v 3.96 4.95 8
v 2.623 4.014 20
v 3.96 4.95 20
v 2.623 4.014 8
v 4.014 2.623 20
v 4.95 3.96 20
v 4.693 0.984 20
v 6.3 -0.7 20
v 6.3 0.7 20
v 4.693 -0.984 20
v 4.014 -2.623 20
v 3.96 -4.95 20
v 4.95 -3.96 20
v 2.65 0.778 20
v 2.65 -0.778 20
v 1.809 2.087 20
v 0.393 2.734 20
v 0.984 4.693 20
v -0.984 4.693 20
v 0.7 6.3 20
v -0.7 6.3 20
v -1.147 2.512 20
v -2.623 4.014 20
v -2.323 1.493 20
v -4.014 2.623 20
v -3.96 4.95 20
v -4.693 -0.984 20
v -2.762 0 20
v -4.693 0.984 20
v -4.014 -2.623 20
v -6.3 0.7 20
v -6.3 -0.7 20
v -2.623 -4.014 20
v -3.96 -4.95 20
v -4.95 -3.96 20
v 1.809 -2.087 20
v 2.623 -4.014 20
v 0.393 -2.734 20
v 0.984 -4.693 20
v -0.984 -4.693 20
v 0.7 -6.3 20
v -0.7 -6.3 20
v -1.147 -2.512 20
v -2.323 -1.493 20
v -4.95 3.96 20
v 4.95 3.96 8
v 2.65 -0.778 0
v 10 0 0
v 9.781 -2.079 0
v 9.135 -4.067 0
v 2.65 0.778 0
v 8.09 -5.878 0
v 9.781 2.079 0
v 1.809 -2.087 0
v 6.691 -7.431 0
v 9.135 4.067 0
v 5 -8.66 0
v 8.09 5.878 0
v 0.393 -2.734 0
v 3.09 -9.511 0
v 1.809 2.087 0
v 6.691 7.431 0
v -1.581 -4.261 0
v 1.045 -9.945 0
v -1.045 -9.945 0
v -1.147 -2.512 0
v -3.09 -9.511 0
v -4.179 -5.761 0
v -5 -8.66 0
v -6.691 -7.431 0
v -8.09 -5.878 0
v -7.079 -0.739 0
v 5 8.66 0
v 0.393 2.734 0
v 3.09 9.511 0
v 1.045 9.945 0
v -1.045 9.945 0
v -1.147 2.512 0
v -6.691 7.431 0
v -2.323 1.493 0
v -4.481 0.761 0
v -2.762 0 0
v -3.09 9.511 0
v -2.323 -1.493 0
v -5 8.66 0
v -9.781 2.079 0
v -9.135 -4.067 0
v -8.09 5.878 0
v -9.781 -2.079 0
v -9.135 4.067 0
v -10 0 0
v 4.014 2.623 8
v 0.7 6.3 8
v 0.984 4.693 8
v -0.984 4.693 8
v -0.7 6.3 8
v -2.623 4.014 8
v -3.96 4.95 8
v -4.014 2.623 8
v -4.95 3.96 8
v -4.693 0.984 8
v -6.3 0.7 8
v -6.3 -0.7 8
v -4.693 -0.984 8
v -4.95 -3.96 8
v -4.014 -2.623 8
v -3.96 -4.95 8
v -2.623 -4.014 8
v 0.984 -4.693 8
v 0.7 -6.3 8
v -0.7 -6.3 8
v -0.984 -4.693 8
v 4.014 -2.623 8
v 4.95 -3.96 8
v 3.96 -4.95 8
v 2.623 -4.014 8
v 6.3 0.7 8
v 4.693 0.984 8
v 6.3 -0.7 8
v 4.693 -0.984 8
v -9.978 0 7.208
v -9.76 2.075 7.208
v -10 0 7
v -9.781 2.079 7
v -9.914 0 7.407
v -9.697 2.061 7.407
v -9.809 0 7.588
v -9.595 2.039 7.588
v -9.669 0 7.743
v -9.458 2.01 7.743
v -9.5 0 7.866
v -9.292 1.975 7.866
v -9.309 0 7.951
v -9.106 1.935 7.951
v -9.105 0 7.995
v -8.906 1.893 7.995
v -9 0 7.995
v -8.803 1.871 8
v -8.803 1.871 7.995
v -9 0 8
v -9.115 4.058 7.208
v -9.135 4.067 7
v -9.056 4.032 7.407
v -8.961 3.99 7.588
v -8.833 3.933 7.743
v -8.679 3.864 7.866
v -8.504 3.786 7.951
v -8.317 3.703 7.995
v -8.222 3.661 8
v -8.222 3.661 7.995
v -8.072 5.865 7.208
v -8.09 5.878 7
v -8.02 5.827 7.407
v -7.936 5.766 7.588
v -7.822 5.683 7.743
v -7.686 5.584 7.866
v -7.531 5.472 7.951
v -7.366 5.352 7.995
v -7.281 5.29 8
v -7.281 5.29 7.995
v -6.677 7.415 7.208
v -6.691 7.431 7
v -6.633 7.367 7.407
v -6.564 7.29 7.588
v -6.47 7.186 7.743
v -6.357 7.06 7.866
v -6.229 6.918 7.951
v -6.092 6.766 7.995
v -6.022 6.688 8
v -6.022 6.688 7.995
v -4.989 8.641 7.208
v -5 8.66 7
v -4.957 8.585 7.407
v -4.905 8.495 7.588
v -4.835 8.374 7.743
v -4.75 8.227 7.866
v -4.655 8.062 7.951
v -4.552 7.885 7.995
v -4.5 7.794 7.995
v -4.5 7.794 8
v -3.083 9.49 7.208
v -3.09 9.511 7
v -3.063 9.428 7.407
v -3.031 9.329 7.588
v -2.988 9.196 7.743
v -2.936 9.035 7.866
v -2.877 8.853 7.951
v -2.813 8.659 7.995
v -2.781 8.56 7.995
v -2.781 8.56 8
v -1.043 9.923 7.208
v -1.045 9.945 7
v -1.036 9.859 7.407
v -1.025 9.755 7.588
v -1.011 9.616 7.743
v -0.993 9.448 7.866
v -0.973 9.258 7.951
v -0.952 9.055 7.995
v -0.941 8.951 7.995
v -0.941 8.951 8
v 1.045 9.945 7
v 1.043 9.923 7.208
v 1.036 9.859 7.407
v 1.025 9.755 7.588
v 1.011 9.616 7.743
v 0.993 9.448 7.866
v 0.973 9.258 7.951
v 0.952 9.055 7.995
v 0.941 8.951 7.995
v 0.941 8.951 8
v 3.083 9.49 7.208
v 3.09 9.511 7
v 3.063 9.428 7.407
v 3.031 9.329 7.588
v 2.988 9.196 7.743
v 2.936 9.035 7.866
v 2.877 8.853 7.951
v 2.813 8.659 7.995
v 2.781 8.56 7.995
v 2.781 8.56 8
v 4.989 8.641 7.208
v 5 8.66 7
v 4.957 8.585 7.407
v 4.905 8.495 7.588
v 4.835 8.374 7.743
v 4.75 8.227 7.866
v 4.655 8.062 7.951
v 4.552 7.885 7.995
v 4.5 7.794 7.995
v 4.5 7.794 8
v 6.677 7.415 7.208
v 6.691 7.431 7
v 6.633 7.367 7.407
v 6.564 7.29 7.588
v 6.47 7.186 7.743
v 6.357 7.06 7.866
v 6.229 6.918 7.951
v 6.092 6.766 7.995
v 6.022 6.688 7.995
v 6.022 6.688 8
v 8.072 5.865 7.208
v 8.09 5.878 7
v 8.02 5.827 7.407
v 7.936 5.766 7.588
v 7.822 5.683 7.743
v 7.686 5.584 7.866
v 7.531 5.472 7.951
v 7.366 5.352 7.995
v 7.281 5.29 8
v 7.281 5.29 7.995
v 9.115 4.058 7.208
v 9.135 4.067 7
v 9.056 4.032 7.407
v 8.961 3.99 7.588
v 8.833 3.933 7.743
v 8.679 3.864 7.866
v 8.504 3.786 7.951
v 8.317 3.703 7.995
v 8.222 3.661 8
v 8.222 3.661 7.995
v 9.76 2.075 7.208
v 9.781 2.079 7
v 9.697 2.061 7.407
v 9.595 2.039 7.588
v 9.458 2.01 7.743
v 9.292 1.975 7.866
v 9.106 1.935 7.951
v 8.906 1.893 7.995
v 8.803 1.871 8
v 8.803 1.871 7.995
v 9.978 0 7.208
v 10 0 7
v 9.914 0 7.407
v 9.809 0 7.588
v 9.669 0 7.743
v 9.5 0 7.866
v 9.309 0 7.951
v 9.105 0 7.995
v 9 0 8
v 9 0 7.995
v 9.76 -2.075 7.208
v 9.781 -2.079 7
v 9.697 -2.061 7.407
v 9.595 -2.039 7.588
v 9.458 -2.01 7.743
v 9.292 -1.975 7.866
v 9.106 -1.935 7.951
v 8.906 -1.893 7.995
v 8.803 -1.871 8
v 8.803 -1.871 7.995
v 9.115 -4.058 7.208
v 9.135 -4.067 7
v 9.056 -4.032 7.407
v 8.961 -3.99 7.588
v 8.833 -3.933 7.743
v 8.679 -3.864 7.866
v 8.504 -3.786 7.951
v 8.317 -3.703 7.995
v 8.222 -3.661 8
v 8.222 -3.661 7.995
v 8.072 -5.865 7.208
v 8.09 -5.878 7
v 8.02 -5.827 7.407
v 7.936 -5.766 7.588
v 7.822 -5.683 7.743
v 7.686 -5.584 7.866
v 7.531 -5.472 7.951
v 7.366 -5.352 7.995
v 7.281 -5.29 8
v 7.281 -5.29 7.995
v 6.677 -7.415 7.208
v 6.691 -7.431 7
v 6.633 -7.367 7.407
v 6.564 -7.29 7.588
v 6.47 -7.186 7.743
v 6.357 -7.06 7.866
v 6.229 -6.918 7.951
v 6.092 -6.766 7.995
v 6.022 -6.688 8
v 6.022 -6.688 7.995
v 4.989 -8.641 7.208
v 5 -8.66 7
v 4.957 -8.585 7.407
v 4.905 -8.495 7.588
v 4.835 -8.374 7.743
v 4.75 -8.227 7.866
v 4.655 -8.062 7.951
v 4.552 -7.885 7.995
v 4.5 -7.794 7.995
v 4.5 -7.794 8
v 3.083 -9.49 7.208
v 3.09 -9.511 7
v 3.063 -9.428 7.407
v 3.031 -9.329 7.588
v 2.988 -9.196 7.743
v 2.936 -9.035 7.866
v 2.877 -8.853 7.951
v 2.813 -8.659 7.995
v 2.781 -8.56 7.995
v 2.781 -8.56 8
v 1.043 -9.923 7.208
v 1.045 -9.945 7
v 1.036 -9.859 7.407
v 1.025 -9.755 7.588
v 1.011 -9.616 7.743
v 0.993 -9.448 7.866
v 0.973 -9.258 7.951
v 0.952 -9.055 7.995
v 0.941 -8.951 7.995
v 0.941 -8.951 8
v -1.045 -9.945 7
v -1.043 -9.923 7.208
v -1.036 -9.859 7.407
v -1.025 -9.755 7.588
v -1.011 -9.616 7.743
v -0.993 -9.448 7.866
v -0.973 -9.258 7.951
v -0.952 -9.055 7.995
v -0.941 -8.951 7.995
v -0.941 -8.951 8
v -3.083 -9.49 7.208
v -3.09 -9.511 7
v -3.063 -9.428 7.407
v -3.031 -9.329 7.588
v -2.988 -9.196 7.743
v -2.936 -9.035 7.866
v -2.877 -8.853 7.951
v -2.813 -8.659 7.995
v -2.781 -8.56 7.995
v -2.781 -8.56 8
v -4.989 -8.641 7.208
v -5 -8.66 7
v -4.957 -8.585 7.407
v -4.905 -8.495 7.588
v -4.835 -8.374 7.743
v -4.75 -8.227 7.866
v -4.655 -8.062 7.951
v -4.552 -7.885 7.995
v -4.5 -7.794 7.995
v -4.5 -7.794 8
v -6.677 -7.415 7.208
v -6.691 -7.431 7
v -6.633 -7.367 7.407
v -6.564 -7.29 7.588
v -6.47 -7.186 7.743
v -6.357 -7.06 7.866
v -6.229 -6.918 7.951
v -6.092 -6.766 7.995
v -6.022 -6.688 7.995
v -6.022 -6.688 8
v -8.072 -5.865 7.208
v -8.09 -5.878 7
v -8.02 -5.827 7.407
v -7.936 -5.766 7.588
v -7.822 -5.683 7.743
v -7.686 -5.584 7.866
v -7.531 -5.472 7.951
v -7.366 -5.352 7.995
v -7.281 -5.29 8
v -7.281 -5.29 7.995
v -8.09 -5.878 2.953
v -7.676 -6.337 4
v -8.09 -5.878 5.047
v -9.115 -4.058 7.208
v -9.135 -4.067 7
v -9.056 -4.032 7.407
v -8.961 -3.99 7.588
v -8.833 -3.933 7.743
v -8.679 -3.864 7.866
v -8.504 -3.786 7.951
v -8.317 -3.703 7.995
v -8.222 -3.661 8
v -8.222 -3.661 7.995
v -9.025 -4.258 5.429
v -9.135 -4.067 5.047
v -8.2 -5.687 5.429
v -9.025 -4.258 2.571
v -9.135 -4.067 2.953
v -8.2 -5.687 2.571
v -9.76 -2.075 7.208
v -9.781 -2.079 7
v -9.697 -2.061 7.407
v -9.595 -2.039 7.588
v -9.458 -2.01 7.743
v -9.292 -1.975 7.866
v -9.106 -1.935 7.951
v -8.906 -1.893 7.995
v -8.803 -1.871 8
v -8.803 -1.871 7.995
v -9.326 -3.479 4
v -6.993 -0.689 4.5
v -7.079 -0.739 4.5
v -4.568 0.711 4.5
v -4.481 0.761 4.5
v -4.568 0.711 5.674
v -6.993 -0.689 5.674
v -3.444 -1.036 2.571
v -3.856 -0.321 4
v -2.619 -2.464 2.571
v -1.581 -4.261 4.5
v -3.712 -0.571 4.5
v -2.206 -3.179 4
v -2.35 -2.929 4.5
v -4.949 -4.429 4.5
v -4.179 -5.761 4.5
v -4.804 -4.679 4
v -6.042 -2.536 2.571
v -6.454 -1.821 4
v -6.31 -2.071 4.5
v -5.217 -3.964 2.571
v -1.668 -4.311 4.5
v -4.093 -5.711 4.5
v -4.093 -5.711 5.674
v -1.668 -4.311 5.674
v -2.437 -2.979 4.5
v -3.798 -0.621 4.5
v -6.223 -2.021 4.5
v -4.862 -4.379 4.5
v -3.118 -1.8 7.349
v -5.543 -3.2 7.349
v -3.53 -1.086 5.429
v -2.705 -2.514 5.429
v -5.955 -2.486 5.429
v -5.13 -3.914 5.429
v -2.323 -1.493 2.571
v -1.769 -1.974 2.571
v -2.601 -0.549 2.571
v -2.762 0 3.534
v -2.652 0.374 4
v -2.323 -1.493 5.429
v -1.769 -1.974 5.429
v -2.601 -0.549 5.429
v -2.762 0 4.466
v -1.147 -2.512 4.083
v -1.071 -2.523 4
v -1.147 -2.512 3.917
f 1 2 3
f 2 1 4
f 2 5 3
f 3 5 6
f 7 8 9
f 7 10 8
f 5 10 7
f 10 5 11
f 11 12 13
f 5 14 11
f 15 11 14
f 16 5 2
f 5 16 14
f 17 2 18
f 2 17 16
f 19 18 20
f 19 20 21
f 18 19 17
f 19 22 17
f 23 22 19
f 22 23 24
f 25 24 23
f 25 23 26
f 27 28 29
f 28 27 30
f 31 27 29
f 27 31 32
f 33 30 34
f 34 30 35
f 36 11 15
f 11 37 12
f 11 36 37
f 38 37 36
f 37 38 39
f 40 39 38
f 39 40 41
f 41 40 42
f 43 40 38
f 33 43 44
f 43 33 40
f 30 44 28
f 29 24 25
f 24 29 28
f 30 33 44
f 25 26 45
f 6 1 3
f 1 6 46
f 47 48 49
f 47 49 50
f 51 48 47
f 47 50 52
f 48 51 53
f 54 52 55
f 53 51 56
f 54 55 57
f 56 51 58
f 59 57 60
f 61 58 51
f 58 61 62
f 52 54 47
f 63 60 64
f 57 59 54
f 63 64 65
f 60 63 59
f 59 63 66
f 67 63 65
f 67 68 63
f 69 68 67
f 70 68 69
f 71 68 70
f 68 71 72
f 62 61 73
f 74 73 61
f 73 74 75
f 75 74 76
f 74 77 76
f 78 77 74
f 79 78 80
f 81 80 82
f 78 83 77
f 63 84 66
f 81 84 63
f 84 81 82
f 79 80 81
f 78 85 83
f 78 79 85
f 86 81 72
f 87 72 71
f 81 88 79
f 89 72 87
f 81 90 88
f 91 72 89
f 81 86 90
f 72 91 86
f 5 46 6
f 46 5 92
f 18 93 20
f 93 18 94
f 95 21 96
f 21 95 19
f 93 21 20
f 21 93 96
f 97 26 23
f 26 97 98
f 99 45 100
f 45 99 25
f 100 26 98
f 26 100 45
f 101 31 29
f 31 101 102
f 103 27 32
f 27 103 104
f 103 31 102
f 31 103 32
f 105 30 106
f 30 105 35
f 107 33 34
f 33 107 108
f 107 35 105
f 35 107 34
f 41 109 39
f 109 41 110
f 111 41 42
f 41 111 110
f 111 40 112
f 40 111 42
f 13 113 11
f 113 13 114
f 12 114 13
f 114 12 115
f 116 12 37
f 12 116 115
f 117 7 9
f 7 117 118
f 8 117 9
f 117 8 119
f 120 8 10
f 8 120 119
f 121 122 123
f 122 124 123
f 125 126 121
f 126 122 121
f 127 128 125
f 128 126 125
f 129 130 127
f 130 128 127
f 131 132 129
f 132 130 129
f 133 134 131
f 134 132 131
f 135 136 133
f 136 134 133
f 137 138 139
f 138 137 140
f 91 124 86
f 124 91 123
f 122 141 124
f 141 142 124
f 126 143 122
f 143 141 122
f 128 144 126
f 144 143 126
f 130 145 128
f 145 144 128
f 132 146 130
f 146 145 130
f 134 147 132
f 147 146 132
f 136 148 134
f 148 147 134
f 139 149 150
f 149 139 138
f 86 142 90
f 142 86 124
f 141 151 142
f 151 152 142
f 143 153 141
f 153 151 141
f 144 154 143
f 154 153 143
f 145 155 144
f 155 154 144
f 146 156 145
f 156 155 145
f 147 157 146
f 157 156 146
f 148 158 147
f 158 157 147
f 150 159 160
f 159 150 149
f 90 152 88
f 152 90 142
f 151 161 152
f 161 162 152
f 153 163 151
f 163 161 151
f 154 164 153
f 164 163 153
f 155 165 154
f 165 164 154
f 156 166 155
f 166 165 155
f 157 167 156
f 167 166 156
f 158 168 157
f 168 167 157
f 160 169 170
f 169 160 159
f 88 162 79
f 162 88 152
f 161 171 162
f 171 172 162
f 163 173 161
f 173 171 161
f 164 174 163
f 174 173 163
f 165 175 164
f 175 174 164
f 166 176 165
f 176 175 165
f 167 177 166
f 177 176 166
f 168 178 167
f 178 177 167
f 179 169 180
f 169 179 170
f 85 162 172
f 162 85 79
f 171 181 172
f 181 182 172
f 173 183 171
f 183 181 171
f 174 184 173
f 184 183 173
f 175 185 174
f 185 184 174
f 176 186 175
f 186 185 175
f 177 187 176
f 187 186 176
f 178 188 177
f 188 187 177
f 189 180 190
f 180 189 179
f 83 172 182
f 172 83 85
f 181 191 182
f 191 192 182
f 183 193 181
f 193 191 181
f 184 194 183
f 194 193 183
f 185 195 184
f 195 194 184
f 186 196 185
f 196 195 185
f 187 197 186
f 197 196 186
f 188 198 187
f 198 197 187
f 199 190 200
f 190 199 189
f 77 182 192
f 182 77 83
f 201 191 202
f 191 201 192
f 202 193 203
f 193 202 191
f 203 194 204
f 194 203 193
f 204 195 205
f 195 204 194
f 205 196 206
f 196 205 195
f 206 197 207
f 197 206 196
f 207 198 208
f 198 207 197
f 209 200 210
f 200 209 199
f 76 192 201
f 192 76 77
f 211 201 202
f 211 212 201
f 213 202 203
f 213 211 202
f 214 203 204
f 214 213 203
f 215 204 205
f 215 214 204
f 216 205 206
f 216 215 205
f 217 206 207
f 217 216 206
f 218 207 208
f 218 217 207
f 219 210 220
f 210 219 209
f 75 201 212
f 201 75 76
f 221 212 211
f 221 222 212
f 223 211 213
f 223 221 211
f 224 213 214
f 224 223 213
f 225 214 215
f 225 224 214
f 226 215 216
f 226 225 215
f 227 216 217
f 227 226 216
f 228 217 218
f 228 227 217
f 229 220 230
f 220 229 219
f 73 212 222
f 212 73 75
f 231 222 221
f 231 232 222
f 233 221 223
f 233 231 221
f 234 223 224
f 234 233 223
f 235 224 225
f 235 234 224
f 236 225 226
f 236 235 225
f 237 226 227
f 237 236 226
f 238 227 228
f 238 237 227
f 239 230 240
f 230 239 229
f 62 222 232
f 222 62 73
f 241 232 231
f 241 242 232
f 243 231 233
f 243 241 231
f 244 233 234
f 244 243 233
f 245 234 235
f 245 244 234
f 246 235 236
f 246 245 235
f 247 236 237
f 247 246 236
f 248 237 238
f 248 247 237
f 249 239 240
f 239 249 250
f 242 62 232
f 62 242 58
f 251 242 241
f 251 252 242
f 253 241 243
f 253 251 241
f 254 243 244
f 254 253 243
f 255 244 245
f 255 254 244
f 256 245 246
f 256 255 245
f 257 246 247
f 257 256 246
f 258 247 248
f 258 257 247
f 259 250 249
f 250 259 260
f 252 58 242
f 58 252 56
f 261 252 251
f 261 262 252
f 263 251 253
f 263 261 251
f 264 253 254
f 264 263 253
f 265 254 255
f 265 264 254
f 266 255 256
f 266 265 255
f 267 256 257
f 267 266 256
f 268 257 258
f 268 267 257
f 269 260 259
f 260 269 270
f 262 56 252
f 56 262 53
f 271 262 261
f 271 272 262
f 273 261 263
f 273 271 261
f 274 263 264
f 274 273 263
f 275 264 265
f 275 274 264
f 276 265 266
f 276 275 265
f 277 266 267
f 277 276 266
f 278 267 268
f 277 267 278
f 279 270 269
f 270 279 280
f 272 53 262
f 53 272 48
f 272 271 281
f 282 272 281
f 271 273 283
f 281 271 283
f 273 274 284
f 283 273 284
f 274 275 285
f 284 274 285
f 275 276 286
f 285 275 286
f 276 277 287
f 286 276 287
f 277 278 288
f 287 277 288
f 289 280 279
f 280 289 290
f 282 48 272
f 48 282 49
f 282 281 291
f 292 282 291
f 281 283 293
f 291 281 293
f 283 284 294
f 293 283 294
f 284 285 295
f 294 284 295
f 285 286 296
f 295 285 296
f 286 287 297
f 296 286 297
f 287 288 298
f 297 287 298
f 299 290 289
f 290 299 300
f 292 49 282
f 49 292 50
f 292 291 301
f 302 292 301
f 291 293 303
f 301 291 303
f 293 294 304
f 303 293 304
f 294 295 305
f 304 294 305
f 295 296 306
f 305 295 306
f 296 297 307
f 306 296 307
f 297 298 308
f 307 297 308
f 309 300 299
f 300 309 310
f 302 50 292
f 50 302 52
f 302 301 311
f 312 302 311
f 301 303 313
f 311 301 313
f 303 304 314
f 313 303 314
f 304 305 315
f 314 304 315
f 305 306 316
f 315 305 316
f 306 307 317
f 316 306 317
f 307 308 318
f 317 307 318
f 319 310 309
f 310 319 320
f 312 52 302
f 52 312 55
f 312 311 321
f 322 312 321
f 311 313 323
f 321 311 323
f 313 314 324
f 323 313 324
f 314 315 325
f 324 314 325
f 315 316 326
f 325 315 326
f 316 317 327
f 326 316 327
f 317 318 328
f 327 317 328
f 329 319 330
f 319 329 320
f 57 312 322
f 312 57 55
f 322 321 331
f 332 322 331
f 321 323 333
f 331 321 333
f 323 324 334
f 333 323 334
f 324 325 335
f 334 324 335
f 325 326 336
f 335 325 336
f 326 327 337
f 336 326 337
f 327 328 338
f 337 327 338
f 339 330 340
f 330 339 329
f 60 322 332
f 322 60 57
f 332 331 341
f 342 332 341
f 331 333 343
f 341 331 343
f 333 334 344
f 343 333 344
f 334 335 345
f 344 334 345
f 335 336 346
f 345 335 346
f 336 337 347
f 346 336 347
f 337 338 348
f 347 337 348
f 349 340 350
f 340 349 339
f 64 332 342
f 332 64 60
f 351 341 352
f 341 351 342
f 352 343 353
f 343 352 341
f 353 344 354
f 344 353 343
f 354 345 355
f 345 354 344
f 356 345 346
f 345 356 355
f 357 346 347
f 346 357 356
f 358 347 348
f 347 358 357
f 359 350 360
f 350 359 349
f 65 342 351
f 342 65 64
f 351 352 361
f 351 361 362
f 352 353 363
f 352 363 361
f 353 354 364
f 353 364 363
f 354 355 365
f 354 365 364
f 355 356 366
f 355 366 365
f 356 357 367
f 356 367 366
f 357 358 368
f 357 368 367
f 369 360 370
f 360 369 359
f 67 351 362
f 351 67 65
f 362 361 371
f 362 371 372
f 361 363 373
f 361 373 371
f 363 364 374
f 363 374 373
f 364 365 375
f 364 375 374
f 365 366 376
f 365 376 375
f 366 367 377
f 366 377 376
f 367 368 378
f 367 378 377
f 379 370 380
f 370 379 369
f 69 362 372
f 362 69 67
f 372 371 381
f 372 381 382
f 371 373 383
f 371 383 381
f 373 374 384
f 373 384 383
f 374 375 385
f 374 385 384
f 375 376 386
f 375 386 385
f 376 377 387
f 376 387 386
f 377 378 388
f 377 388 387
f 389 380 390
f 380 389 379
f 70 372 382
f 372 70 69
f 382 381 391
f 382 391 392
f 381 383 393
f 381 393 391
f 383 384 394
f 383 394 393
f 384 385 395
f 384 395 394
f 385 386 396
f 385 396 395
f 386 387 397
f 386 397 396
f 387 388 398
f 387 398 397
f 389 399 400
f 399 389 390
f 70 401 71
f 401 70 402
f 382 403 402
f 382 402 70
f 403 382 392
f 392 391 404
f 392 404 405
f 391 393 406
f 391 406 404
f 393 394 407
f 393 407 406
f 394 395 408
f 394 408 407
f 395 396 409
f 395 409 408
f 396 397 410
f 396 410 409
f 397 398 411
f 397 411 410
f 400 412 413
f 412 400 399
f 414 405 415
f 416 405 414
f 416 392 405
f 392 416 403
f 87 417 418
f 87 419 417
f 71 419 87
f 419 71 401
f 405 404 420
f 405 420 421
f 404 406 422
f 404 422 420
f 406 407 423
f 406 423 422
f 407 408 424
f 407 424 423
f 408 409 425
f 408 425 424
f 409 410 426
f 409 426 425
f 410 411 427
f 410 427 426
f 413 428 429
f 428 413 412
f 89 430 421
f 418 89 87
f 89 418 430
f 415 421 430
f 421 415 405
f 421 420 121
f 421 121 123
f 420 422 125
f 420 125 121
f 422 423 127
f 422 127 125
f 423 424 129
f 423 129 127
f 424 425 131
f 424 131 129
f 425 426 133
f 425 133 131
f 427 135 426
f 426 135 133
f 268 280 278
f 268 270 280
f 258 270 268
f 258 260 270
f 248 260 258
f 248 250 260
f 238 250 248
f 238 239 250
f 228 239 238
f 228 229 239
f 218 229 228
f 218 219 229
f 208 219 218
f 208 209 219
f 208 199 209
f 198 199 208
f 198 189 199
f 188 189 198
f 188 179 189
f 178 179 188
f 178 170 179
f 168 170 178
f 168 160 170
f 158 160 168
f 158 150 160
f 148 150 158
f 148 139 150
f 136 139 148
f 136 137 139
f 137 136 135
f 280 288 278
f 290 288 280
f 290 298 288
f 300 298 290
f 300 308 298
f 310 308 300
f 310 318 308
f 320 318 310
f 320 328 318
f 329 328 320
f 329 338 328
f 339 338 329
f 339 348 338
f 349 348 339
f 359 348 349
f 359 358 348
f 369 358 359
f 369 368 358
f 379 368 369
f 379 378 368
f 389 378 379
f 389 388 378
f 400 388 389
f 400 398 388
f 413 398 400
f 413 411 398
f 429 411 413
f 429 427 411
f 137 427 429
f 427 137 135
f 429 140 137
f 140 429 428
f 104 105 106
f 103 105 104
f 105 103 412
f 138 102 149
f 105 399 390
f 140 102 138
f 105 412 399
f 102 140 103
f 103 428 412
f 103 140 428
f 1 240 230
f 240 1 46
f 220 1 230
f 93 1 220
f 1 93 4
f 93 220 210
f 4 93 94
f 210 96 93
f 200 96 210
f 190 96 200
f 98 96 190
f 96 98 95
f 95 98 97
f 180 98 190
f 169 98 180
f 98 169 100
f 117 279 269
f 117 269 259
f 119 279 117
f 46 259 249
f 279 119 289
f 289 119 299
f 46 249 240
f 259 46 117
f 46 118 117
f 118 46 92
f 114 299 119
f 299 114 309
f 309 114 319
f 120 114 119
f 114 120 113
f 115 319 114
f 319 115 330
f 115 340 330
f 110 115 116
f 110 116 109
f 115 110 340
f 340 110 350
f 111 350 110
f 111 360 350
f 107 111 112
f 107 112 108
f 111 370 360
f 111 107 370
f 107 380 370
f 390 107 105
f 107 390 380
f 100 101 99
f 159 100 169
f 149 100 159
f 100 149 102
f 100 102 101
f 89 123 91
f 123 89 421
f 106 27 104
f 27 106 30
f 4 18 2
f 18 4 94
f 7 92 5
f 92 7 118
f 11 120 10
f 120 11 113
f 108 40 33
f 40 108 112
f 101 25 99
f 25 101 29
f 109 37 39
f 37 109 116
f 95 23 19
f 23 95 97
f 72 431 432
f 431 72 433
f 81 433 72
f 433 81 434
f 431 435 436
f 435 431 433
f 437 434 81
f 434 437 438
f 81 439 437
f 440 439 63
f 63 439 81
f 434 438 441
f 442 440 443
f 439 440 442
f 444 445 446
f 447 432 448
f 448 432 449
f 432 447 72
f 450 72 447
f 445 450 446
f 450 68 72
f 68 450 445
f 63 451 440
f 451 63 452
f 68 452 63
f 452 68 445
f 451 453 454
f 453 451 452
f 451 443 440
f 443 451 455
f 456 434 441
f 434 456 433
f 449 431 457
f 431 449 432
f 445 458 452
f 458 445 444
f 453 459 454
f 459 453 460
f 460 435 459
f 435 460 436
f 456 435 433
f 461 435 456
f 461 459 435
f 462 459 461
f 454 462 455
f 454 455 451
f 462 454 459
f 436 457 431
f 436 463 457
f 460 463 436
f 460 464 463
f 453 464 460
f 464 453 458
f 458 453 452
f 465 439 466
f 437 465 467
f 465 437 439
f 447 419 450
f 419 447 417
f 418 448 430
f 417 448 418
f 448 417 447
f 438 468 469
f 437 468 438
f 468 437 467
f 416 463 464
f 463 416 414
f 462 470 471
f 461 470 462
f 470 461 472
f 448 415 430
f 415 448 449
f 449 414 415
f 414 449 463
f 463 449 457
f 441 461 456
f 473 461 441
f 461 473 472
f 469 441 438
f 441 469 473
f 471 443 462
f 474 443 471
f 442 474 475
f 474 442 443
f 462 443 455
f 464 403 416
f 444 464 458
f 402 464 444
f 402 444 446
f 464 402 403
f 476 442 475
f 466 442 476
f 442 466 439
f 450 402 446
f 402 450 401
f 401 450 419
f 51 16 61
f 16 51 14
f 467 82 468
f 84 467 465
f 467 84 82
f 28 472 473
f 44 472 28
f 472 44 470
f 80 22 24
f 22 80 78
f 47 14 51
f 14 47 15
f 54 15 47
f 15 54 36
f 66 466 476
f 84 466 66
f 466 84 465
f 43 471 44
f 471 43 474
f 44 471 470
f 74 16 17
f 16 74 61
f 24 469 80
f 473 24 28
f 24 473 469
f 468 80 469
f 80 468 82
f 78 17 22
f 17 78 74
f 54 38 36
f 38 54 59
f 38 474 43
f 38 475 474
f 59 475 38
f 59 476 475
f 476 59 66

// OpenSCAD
// file: configuration.scad
// PRUSA Mendel  
// Configuration file
// GNU GPL v2
// Josef Průša
// josefprusa@me.com
// prusadjs.cz
// http://www.reprap.org/wiki/Prusa_Mendel
// http://github.com/prusajr/PrusaMendel

// PLEASE SELECT ONE OF THE CONFIGURATIONS BELOW
// BY UN-COMMENTING IT

variant=0; //0 for metric
//variant=1; //1 for SAE
if(variant==0){
echo("variant: metric");
}else if(variant==1){
echo("variant: sae");
} else{
echo("WARNING: INVALID CONFIGURATION");
}


vars=[
//[m8_dia, m8_nut, m4_dia, m4_nut, m3_dia, m3_nut, bush_dia, mot_shaft, bush_rod, bush_outerdia, bush_length]
[8.3,16.4,4.3,9,3.3,7,11,5.3,8,16,11],//metric
[9,15.7,5.5,10.6,5.5,10.6,11.5,5.3,7.9375,16,11]//SAE
];

//BUSHING TYPE Can generate three versions
// 1 - regular old ones
// 2 - helical ones
// 3 - holders for brass or any other bought bushings
bushing_type = 2;

//Round corner diameter
round_corner_diameter = 8;

//X end parameters
axis_diameter_real = 4;
axis_diameter_larger = 4.2 ;
pressure_pad_height = 0.7;

//Thin wall size
layer_height = 0.4;
perimeter_width_over_thicknes = 1.6;
infill_widht_over_thickness = 1.55;
thin_wall = 2*(perimeter_width_over_thicknes*layer_height+infill_widht_over_thickness*layer_height);
if(thin_wall<2){
	echo("Check thin wall size, its below 2mm!");
}
echo(thin_wall);

//DO NOT TOUCH THIS SECTION!
m8_diameter = vars[variant][0];
m8_nut_diameter = vars[variant][1];
m4_diameter = vars[variant][2];
m4_nut_diameter = vars[variant][3];
m3_diameter = vars[variant][4];
m3_nut_diameter = vars[variant][5];
bushing_diameter = vars[variant][6];
motor_shaft=vars[variant][7];
bushing_rodsize = vars[variant][8];
bushing_outerDiameter = vars[variant][9];
bushing_lenght = vars[variant][10];


// MINI-HUXLEY VERSION (TODO, just place holder)
// include <configuration-huxley.scad>

// MEGA VERSION (TODO, just place holder)
// include <configuration-mega.scad>


// Some basic functions, probably should be somewhere else
module roundcorner(diameter){
	difference(){
		cube(size = [diameter,diameter,99], center = false);
		translate(v = [diameter, diameter, 0]) cylinder(h = 100, r=diameter, center=true);
	}
}
module polyhole(h, d) {
    n = max(round(2 * d),3);
    rotate([0,0,180])
        cylinder(h = h, r = (d / 2) / cos (180 / n), $fn = n);
}
// main file
// Belt pulley is http://www.thingiverse.com/thing:3104 by GilesBathgate
// GPLV3

include <configuration.scad>


/**
 * @name Pulley
 * @category Printed
 * @using 1 m3nut
 * @using 1 m3x10
 */
module pulley()
{


	module spur()
	{
		linear_extrude(height=20) polygon([[-1,-1],[-1,1],[0.7,0.7],[0.7,-0.7]],[[0,1,2,3,0]]);
	}
	
 difference()
 {	 
 	union()
 	{
 		//base
 		rotate_extrude($fn=30)
 		{
 				square([9,8]);
 				square([10,7]);
 				translate([9,7]) circle(1);
 		}
    	
    	//shaft
    	cylinder(r=motor_shaft-0.2,h=20, $fn=8);
    	
    	//spurs
    	for(i=[1:8]) rotate([0,0,i*(360/8)])
    	translate([5.6,0,0])spur();
   }
   
   //shaft hole
    translate([0,0,-1]) //cylinder(r=motor_shaft/2+0.1,h=22,$fn=15);
	polyhole(22,motor_shaft);
    		
 //captive nut and grub holes
    for(j=[1:1]) rotate([0,0,j*(360/3)])
	translate([0,20,4])rotate([90,0,0])
	union()
	{
		//entrance
		translate([0,-3,15]) cube([5.8,7,3],center=true);
		//nut
		translate([0,0,13.6]) rotate([0,0,30])cylinder(r=5.8 / sqrt(3),h=2.8,$fn=6);
		//grub hole
		translate([0,0,9]) cylinder(r=3.3/2,h=10);
	}

 }

   
}

pulley();
